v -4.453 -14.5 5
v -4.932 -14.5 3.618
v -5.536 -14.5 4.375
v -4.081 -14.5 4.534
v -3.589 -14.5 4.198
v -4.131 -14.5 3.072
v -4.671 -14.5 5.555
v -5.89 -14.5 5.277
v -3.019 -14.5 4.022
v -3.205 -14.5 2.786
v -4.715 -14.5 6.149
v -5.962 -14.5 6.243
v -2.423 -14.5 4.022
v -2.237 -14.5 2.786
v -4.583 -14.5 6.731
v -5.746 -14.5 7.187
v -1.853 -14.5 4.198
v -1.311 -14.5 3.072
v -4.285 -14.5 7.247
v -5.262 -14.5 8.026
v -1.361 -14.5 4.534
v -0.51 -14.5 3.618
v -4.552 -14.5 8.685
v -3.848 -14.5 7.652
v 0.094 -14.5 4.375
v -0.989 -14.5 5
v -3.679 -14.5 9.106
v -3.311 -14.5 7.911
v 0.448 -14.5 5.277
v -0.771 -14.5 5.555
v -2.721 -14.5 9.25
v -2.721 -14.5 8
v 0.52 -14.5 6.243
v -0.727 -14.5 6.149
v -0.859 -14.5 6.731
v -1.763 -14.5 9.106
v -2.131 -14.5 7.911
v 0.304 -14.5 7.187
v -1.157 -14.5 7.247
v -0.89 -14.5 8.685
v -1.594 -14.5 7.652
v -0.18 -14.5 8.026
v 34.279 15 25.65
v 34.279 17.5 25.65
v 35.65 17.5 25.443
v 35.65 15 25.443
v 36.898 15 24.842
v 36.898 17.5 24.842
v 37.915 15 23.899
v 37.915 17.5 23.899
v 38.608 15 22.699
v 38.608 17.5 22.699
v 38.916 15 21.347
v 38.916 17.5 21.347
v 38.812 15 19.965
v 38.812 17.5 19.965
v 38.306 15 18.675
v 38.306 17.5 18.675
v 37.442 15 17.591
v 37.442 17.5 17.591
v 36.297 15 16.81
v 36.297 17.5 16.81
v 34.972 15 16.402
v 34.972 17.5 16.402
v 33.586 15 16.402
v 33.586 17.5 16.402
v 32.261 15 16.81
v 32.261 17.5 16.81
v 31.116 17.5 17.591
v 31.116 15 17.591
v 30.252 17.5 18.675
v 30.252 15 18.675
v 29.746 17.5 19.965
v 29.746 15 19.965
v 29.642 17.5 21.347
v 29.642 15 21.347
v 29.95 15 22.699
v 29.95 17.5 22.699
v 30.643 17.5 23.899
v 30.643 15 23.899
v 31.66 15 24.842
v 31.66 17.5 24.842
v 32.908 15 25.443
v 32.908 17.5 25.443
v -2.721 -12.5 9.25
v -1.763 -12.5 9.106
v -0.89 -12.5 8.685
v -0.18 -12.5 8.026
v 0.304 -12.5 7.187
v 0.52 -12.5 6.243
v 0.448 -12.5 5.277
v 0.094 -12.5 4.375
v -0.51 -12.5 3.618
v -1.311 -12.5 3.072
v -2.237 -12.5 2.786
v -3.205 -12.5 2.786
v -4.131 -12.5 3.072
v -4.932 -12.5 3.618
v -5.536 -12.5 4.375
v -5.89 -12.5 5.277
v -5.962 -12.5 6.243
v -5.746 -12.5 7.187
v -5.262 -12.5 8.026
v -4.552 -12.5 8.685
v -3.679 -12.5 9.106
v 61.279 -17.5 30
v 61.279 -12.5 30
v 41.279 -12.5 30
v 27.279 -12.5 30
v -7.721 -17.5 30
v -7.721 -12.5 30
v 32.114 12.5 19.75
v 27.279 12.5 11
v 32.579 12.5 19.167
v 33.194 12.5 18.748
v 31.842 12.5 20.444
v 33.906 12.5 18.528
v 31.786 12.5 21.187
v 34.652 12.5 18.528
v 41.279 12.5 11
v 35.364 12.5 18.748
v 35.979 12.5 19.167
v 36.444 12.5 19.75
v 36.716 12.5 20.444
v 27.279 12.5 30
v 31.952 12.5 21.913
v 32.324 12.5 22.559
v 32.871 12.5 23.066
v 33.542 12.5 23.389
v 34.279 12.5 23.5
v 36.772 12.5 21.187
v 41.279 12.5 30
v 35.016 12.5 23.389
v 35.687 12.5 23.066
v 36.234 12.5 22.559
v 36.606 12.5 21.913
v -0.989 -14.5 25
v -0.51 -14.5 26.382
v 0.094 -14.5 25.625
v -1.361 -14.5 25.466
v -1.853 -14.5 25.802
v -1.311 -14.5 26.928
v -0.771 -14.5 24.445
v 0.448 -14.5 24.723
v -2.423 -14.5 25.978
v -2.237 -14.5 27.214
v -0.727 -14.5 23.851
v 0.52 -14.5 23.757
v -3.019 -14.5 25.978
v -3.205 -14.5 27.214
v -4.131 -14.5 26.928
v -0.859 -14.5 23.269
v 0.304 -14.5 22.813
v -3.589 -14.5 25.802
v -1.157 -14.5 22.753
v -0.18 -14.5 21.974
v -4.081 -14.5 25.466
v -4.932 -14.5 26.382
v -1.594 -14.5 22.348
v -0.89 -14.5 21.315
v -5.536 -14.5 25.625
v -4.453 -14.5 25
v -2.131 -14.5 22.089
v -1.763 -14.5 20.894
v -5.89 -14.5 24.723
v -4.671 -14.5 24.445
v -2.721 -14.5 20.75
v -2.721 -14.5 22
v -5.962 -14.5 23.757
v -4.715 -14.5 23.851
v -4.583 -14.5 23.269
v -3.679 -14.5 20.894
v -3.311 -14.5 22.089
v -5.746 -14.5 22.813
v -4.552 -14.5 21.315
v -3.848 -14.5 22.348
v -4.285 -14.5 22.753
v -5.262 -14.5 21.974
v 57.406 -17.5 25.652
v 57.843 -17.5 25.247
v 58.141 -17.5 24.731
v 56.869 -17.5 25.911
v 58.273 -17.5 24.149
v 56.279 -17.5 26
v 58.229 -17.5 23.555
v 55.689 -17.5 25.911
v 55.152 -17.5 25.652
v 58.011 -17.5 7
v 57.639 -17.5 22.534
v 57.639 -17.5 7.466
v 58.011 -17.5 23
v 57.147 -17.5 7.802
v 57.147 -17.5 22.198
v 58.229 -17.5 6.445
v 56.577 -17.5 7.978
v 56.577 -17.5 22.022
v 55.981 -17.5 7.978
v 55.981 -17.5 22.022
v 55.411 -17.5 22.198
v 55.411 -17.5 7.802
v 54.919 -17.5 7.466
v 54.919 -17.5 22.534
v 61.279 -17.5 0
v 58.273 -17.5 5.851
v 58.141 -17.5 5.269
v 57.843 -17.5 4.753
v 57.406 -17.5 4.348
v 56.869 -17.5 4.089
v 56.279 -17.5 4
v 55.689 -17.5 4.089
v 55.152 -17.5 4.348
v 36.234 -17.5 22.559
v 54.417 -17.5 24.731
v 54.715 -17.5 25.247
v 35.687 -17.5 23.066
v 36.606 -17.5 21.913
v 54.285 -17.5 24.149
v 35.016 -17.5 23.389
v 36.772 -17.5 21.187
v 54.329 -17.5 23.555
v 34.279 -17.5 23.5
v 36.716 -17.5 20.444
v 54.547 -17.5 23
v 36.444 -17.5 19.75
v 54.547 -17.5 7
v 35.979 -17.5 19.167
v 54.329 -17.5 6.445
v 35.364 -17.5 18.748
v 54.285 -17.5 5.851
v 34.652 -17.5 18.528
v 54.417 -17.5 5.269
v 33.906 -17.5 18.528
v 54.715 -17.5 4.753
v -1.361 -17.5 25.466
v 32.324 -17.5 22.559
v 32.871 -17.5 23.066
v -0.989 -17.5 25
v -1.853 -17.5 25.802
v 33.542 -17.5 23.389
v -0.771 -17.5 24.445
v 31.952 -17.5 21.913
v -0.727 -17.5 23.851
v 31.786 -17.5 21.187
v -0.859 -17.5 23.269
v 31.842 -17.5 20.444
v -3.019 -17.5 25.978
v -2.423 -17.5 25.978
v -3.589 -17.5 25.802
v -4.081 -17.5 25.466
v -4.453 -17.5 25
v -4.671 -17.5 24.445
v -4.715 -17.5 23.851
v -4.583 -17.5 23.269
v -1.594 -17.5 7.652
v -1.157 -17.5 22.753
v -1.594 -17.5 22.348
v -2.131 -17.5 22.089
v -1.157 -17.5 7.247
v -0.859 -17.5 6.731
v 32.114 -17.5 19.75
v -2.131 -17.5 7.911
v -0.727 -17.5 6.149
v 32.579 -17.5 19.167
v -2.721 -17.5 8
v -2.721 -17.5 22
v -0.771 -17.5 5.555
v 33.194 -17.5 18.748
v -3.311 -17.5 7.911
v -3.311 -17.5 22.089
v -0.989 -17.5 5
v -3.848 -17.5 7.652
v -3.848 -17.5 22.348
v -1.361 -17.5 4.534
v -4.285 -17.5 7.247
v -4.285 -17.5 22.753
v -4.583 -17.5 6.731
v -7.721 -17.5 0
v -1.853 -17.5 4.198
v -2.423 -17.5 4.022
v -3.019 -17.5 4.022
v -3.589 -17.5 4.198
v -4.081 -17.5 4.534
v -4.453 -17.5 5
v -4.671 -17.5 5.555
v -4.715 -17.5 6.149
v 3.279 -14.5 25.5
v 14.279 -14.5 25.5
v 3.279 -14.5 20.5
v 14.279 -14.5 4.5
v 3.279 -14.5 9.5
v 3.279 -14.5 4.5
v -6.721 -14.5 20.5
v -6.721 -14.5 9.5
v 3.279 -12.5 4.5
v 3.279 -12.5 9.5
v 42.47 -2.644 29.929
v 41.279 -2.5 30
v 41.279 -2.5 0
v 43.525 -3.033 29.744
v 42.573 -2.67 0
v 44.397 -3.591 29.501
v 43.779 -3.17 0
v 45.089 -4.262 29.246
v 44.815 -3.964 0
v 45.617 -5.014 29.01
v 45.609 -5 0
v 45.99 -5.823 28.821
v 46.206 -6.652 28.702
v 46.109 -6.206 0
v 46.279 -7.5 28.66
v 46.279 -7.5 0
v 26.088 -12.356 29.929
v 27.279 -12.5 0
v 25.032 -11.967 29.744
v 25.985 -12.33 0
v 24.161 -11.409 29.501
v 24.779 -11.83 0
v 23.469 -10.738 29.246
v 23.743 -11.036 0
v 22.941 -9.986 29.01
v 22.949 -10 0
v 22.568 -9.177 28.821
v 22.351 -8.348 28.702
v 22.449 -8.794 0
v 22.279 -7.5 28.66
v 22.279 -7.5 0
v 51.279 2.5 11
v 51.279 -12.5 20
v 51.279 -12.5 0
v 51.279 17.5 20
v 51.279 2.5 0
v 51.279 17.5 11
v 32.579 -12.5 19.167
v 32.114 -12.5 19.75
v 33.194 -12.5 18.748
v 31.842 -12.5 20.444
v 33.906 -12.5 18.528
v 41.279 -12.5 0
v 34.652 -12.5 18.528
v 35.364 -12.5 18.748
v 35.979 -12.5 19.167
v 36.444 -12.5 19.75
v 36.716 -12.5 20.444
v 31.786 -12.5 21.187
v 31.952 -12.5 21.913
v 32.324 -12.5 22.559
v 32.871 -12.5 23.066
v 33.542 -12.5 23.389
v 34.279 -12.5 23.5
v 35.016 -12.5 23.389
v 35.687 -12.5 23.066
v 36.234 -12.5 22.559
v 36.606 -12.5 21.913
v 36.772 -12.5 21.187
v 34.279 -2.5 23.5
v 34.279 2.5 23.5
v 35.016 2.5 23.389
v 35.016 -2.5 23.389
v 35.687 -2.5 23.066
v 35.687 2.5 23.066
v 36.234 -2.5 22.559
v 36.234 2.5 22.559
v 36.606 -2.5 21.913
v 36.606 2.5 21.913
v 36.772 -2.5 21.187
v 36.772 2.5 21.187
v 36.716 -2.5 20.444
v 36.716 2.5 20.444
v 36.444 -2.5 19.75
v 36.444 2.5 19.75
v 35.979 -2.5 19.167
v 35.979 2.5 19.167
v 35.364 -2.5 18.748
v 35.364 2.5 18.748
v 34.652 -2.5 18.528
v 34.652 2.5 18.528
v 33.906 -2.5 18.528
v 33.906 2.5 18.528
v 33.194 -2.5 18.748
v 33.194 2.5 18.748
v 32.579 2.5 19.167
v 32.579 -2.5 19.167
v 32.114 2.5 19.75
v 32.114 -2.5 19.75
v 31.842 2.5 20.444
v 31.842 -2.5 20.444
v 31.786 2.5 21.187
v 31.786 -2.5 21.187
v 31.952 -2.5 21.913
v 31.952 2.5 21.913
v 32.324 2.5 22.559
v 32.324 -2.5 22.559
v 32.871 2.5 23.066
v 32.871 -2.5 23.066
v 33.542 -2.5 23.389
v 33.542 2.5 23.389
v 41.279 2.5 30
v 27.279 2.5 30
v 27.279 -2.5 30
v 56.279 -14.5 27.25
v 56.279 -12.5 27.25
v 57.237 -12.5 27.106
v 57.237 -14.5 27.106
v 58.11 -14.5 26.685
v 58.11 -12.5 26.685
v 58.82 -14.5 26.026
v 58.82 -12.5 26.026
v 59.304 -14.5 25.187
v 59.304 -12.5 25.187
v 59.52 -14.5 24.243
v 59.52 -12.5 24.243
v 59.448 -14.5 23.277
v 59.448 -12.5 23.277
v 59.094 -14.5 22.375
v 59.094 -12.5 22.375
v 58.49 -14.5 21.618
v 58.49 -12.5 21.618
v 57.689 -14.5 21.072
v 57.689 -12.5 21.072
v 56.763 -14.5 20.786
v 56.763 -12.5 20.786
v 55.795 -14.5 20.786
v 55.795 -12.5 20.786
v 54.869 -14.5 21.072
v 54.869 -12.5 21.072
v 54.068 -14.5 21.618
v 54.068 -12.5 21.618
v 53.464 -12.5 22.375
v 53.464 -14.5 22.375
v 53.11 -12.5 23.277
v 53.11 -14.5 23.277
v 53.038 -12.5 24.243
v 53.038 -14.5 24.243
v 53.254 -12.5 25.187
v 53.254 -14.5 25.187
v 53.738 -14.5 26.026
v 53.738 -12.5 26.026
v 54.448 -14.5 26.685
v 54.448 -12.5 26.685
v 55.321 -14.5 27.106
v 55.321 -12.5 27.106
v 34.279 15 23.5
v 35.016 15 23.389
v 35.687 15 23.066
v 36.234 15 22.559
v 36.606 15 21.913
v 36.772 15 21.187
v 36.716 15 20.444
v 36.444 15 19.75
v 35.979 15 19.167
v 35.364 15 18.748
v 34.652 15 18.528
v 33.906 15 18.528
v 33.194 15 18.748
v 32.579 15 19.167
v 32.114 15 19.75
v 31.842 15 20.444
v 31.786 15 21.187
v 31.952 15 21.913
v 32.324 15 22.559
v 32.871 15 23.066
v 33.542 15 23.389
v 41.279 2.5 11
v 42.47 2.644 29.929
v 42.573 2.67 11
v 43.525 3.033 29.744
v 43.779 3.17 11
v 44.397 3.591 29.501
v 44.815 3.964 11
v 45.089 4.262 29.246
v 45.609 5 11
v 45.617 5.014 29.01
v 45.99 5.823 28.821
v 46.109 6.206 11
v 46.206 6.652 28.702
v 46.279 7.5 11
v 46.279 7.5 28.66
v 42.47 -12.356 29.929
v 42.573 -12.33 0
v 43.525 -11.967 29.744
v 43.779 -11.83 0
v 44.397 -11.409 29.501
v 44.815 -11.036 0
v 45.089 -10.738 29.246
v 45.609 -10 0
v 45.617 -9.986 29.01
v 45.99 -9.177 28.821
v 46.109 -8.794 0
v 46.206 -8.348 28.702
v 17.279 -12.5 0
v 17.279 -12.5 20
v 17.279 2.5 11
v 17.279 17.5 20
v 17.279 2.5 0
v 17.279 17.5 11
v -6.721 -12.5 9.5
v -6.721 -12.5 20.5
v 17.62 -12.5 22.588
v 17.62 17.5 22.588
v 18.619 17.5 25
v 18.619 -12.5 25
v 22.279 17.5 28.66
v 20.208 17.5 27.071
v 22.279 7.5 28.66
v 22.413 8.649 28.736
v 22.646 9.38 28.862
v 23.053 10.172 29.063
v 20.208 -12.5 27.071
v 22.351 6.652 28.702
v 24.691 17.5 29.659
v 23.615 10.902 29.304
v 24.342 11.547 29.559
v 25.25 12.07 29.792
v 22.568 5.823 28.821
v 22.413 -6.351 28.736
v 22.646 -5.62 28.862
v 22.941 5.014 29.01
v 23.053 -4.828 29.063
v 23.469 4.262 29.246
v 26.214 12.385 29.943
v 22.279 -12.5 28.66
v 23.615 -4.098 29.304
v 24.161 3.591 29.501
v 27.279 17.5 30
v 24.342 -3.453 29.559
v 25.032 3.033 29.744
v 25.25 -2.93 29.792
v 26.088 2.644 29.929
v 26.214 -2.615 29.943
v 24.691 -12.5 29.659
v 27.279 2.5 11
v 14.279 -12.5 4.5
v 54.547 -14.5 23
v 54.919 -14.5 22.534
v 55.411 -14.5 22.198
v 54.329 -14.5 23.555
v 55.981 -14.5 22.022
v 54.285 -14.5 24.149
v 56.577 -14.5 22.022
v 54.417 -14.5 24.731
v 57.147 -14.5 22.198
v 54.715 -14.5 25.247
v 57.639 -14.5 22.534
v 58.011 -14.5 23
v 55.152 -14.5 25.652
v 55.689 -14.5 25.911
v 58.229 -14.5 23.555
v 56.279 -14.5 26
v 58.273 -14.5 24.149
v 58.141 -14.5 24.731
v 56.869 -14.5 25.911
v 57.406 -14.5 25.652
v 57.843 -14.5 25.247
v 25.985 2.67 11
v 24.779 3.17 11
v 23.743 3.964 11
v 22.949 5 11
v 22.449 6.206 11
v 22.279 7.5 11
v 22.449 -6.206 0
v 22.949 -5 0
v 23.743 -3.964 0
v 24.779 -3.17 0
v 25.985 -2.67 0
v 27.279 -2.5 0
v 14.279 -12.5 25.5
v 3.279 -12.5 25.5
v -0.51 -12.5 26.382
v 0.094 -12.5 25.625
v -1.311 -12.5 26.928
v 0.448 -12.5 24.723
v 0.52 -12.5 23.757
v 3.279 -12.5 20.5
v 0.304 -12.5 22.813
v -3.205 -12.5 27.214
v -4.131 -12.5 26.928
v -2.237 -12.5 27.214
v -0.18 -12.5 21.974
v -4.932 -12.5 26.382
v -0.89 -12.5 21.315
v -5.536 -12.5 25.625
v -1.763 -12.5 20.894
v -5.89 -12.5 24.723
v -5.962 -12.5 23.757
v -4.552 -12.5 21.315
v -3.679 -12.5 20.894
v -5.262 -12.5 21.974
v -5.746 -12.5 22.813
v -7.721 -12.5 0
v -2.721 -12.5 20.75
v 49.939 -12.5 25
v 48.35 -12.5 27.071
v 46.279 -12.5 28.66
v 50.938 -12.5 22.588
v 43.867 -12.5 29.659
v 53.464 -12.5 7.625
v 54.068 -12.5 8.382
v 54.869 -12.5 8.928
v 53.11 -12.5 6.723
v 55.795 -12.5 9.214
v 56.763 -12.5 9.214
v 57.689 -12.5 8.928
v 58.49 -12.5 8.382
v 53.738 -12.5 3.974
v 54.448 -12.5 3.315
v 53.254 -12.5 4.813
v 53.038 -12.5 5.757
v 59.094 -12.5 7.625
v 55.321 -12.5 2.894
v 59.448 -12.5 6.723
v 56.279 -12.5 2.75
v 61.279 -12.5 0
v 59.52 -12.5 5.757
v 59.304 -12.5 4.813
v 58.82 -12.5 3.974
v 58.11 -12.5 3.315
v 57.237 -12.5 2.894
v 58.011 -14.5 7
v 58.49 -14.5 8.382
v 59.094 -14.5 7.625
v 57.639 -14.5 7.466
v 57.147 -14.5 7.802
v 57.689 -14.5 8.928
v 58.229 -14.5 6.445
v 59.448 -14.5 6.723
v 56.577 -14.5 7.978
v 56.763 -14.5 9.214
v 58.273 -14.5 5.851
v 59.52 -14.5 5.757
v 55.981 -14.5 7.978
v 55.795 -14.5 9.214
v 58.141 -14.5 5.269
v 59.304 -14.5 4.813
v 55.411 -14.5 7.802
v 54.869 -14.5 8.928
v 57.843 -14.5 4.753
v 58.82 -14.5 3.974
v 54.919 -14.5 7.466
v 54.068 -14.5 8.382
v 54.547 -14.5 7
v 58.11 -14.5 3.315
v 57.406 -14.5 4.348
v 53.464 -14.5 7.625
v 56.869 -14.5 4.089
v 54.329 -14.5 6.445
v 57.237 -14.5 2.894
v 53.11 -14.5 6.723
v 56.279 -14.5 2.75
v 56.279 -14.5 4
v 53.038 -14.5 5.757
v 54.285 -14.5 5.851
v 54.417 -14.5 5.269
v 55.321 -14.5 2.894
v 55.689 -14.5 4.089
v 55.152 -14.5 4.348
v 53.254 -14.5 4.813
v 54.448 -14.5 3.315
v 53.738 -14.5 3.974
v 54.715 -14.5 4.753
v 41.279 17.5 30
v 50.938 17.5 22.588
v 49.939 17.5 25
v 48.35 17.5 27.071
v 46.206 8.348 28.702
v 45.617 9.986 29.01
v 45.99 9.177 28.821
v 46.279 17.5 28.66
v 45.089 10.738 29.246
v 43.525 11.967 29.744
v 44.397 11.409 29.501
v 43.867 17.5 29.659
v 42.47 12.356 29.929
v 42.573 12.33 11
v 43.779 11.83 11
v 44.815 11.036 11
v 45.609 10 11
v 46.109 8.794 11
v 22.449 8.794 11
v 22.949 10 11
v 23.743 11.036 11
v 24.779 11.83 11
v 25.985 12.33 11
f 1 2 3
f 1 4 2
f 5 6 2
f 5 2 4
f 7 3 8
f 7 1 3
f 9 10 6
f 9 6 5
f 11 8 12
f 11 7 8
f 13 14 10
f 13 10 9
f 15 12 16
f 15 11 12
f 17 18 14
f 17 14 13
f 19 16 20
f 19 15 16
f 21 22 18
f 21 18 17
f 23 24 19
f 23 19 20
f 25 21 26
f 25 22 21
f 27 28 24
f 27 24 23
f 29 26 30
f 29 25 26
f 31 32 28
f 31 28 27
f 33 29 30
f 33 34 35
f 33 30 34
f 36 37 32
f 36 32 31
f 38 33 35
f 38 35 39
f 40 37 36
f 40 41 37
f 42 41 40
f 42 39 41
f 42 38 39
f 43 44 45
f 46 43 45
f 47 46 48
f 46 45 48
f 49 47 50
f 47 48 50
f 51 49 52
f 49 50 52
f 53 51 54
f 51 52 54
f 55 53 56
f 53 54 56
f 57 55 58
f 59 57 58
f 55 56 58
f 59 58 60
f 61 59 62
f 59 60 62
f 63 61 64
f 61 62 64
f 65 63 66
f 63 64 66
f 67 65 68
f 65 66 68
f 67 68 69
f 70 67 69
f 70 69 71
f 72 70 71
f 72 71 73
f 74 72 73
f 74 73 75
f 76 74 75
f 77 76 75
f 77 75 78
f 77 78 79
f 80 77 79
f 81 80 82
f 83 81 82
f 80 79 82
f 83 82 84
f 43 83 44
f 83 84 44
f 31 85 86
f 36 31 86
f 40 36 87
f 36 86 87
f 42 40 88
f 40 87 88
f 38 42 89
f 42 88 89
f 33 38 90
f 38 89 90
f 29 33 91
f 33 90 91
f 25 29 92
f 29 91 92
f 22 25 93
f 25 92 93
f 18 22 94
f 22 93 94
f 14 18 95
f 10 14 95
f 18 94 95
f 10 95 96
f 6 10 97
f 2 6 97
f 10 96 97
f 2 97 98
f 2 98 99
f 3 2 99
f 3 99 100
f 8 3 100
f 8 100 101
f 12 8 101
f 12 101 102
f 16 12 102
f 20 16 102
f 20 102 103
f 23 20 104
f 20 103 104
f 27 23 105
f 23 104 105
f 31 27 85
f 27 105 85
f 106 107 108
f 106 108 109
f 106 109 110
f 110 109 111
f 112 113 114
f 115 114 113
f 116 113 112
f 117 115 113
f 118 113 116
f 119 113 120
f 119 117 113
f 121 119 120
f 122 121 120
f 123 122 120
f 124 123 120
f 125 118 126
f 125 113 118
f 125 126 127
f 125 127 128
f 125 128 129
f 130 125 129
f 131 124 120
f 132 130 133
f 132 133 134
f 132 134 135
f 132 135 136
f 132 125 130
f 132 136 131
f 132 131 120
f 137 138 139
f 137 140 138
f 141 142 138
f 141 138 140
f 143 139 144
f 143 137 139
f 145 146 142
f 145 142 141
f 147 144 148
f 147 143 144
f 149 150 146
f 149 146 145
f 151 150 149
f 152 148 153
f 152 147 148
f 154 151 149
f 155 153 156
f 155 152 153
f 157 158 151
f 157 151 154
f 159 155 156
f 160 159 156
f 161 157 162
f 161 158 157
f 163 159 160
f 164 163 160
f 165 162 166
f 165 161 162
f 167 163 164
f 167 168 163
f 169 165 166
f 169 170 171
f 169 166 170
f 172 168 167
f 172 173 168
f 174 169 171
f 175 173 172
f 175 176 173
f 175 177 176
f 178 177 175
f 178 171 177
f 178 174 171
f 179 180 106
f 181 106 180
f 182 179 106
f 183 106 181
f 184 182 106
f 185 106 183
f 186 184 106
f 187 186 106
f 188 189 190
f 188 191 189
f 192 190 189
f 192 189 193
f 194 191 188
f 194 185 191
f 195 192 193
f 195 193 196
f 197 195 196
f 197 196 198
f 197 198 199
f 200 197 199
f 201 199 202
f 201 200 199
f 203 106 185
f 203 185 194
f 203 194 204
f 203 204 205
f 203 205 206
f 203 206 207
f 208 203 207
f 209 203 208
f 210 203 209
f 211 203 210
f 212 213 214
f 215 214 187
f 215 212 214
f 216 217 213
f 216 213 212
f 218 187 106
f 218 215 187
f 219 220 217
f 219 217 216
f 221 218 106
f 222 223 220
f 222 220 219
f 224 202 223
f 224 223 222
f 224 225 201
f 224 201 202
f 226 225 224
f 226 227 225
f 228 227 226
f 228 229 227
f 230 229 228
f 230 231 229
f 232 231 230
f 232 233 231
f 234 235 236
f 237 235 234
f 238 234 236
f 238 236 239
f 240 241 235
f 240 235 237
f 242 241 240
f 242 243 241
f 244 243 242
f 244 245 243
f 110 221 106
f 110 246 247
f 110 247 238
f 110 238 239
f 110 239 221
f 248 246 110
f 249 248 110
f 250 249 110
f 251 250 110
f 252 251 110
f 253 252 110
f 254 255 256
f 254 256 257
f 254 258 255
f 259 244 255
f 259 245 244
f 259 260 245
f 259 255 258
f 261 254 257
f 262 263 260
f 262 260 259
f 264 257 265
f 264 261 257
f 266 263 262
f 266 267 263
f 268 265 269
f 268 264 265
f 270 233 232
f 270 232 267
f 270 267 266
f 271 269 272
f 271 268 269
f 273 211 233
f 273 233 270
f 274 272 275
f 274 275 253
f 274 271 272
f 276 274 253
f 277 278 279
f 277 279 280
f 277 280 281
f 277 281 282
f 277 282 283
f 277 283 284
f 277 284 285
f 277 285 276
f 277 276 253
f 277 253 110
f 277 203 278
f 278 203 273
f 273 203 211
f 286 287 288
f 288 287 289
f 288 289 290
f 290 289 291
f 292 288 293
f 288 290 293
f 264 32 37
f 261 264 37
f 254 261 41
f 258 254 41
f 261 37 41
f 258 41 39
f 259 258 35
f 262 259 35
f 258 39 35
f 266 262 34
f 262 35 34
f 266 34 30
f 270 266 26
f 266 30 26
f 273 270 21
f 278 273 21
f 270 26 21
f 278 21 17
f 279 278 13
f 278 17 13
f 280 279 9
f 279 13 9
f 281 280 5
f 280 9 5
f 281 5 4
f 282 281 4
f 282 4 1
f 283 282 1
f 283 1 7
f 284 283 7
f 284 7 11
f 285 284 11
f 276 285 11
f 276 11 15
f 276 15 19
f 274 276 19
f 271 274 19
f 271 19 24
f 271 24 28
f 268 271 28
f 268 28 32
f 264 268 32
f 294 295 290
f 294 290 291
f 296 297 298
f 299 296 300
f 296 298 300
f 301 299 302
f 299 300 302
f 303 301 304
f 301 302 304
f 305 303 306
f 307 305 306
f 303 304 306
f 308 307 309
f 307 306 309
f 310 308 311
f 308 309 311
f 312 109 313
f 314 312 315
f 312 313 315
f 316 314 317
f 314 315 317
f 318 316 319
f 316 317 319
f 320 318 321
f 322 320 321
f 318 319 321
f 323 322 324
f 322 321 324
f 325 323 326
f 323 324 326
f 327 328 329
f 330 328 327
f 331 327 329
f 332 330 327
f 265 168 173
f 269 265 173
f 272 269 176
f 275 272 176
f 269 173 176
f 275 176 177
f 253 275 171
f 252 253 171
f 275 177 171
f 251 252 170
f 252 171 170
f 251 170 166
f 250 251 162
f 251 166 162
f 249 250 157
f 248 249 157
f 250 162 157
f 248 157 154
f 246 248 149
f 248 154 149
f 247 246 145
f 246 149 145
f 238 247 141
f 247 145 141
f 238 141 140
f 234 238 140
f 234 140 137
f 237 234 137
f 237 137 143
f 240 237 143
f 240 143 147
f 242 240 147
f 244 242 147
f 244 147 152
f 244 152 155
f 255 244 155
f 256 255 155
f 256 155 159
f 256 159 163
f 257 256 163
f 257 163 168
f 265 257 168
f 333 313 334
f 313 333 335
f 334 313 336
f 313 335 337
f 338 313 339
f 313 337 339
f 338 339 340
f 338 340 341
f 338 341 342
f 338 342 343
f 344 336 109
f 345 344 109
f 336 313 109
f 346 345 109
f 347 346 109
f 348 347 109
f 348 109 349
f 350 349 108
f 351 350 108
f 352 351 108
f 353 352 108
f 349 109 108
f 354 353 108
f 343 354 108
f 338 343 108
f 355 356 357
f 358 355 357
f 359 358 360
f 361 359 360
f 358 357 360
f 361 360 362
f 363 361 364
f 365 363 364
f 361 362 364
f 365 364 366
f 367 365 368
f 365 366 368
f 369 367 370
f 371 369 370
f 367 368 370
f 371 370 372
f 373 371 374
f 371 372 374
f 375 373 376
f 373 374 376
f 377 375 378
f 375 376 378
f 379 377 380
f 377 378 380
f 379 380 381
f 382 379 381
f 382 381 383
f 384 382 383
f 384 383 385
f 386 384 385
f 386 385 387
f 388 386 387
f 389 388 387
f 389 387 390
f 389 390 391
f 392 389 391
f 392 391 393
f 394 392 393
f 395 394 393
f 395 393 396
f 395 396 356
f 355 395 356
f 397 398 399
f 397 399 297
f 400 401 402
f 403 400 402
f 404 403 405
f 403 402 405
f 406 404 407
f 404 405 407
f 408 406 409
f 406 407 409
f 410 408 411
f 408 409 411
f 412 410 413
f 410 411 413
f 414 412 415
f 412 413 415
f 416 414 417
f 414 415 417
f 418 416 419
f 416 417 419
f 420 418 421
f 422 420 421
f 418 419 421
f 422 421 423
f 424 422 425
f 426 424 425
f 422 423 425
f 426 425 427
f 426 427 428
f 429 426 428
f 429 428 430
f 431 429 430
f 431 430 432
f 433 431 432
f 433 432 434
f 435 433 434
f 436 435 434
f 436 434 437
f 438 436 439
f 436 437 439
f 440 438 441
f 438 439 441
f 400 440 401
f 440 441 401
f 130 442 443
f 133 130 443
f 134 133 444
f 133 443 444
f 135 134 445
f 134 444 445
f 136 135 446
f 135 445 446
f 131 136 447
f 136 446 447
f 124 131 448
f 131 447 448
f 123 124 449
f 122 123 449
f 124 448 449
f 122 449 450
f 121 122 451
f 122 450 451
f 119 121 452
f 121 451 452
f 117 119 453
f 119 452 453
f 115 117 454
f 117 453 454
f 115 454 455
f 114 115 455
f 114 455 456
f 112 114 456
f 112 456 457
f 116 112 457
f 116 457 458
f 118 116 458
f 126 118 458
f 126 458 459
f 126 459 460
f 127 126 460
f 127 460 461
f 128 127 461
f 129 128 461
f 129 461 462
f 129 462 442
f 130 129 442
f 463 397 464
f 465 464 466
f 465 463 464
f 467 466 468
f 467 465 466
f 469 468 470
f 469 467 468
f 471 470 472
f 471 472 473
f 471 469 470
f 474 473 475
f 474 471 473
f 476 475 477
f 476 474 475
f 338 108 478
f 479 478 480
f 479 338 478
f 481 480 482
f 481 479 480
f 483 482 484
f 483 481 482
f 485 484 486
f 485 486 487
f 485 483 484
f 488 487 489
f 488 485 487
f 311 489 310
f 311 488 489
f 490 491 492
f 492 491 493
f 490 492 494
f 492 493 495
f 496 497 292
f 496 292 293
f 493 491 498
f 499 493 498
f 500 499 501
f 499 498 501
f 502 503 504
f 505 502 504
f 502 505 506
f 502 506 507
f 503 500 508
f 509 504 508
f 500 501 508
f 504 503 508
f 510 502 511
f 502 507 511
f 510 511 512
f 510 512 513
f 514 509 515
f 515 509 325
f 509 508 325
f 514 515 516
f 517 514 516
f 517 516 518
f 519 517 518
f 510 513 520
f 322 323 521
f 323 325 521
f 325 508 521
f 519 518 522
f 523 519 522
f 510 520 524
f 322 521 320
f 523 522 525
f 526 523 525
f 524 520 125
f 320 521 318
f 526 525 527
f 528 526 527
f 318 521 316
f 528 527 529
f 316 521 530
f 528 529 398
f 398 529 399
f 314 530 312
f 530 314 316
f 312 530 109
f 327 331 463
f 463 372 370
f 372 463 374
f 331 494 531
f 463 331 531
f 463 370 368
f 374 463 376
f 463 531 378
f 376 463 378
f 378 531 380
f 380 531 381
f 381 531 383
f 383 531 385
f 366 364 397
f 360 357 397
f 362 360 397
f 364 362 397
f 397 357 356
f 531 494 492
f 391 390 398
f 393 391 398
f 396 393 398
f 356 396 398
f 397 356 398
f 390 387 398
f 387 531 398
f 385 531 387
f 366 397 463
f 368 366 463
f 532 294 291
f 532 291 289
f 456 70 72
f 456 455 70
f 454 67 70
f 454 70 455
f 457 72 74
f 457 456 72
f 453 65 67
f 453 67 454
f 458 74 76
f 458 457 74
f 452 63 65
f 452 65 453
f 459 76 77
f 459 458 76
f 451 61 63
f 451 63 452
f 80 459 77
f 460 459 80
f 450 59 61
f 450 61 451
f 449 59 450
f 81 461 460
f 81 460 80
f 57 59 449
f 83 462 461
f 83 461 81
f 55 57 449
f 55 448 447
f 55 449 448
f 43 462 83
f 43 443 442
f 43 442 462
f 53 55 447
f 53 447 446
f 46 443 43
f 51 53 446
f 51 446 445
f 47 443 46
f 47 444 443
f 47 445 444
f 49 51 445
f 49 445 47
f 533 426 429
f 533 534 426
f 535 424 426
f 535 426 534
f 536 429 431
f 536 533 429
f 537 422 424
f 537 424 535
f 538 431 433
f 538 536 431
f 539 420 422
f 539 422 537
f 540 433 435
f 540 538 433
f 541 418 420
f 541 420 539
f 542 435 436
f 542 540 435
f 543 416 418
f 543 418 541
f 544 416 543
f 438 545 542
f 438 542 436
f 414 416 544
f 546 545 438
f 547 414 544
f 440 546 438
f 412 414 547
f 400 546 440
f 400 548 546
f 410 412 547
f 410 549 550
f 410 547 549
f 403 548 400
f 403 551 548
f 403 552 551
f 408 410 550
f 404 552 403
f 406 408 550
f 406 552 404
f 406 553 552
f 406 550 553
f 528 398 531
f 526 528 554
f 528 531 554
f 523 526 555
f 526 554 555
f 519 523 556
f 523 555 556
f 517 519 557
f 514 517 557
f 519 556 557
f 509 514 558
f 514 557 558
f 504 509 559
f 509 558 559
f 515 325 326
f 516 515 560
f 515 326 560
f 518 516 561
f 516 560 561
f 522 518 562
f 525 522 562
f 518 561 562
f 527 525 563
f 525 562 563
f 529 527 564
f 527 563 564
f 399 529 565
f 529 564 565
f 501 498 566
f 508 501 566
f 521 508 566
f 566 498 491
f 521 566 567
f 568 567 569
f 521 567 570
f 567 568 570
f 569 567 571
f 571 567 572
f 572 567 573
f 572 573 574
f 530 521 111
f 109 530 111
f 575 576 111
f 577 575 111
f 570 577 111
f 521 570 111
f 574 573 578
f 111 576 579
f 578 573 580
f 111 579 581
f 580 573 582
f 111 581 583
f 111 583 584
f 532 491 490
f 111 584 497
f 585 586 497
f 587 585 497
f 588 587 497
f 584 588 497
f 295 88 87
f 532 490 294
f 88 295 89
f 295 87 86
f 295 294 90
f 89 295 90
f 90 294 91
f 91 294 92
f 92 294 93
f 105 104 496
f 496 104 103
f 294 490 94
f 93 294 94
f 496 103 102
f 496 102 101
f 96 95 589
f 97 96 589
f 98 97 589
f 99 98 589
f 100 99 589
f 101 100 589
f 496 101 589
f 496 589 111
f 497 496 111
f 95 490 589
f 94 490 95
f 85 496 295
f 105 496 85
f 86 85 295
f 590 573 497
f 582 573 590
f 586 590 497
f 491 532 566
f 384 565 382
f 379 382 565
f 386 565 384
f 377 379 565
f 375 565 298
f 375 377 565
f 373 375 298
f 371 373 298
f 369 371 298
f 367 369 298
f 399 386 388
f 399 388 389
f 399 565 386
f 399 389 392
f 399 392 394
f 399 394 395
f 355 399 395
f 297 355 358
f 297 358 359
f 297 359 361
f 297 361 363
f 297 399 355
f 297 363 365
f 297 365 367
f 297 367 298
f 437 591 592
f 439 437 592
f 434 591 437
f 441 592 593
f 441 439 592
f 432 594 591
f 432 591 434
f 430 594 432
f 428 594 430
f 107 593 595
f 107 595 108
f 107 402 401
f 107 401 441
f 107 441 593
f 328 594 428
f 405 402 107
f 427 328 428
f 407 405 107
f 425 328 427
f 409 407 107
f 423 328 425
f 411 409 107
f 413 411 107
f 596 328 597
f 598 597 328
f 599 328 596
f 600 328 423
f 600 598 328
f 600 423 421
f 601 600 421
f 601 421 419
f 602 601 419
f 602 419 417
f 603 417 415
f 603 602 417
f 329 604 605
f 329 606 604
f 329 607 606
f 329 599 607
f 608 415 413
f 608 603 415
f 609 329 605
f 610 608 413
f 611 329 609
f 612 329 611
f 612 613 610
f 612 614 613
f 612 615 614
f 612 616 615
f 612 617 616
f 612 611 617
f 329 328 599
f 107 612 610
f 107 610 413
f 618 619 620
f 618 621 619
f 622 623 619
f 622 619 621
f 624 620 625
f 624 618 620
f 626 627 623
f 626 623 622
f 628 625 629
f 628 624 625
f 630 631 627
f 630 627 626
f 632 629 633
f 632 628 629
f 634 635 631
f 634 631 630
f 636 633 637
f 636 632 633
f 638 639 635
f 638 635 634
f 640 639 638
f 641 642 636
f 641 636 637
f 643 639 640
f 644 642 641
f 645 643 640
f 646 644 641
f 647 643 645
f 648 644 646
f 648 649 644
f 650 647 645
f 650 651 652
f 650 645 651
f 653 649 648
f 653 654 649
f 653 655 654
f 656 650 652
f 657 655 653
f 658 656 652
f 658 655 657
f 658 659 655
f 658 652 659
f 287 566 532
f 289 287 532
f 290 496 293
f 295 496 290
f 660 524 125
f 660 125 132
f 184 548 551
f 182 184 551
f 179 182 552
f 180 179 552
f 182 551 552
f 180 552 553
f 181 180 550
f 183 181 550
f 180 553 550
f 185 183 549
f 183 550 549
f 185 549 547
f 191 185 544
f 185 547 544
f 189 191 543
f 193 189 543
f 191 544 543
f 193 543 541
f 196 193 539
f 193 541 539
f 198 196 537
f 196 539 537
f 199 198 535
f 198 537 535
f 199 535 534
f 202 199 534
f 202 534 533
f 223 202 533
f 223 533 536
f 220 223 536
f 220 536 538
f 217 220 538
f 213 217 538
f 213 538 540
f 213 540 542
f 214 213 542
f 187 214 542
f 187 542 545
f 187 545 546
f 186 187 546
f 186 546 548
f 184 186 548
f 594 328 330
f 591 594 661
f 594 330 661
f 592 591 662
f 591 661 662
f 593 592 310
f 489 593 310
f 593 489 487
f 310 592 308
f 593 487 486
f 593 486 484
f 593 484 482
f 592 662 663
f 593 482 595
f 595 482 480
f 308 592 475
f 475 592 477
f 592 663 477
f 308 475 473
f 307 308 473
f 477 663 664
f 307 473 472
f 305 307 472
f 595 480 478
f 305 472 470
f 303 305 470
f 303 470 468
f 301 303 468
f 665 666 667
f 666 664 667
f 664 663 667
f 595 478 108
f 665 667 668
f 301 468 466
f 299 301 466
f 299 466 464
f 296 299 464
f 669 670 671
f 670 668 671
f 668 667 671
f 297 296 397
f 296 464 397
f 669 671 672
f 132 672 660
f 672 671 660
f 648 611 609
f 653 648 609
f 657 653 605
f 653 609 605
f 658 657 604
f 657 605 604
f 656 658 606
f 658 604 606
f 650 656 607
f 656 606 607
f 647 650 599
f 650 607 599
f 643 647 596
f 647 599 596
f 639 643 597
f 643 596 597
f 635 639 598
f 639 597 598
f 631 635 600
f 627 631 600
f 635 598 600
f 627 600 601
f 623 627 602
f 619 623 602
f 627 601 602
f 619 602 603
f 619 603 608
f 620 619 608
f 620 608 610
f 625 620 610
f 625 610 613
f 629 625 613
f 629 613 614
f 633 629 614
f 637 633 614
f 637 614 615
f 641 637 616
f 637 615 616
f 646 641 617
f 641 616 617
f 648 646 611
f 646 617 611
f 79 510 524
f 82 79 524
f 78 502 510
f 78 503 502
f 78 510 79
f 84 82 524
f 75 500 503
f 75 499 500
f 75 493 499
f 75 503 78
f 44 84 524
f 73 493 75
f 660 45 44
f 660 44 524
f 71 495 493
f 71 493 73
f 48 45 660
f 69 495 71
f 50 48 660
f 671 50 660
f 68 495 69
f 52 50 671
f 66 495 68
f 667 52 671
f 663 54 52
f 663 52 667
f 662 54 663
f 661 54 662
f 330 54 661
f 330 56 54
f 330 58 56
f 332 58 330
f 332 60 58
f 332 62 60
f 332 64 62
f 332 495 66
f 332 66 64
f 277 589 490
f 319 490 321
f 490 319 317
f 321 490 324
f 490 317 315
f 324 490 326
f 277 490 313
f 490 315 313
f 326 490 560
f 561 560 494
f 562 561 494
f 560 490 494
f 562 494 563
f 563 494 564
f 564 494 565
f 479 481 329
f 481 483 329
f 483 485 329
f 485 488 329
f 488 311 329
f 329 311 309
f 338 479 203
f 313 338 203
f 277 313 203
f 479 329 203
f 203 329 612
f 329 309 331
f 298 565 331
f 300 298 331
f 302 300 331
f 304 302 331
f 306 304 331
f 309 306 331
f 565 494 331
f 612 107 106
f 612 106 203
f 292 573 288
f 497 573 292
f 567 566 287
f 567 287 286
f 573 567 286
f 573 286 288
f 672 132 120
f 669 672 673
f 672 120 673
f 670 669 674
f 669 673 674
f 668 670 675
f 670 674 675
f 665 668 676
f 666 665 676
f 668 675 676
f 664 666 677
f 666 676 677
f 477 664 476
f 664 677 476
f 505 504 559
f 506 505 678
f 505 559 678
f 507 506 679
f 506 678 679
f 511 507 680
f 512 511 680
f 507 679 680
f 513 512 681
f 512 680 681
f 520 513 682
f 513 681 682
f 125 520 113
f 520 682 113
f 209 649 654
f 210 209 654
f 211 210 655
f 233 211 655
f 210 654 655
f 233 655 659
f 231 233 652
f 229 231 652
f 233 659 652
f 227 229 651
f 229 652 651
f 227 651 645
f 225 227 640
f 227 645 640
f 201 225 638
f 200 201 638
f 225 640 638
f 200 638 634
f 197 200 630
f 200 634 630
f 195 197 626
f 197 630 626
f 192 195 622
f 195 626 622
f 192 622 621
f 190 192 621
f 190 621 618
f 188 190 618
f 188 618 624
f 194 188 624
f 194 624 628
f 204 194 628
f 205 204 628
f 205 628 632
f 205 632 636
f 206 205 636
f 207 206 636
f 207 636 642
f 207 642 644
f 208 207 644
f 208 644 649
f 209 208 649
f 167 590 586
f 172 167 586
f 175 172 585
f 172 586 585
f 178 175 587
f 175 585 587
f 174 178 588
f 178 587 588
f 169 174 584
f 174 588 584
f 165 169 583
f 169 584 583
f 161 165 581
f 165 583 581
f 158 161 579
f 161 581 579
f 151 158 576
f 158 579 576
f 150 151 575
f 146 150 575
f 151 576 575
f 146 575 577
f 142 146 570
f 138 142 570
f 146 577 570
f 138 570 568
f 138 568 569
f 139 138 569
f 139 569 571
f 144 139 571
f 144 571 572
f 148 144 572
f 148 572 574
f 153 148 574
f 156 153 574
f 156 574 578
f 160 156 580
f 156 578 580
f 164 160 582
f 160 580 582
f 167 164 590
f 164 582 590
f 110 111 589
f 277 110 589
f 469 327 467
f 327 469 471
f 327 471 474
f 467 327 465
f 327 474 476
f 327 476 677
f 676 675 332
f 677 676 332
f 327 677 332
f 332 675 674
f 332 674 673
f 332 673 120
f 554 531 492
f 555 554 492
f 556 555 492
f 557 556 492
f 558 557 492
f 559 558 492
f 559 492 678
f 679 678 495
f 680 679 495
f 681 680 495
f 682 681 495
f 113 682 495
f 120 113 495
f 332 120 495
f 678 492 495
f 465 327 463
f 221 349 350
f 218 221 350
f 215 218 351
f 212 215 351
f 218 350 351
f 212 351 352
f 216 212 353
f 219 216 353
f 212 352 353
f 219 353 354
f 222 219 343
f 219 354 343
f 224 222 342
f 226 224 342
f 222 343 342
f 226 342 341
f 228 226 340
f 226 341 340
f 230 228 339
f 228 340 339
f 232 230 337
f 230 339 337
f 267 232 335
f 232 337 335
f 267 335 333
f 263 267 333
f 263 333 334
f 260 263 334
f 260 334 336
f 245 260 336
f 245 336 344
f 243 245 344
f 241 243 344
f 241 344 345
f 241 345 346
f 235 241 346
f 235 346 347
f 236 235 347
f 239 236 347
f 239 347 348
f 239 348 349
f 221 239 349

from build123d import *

# Parameters (mm, degrees)
CROQUIS21_W             = 34
CROQUIS21_H             = 30
SALIENTE_EXTRUIR4_DEPTH = 17.5
CORTAR_EXTRUIR17_REACH  = 63.934
CROQUIS22_W             = 24
CROQUIS22_H             = 10
CORTAR_EXTRUIR18_REACH  = 50.603
CROQUIS23_W             = 11
CROQUIS23_H             = 15
CORTAR_EXTRUIR19_REACH  = 70.953
CROQUIS24_R             = 2.5
CROQUIS25_R             = 4.65
CORTAR_EXTRUIR20_DEPTH  = 2.5
REDONDEO2_R             = 10
REDONDEO3_R             = 5
CROQUIS27_R             = 2
SALIENTE_EXTRUIR5_DEPTH = 5
CROQUIS30_R             = 3.25
CORTAR_EXTRUIR21_DEPTH  = 2


# Some blends are built 0.0001 mm under size
with BuildPart() as part:
    # Croquis21 → Saliente-Extruir4 (new, symmetric)
    with BuildSketch(Plane(origin=(0, 0, 0), x_dir=(1, 0, 0), z_dir=(0, 1, 0))):
        with Locations((34.278993672, -15)):
            Rectangle(CROQUIS21_W, CROQUIS21_H)
    extrude(amount=SALIENTE_EXTRUIR4_DEPTH, both=True)

    # Croquis22 → Cortar-Extruir17 (cut, up to next)
    with BuildSketch(Plane.XY.offset(30), mode=Mode.PRIVATE) as cortar_extruir17_sk1:
        with Locations((34.278993672, 7.5)):
            Rectangle(CROQUIS22_W, CROQUIS22_H)
    cortar_extruir17_tool1 = extrude(cortar_extruir17_sk1.sketch, amount=-CORTAR_EXTRUIR17_REACH, mode=Mode.PRIVATE) & part.part
    # Croquis22 → Cortar-Extruir17 (cut, up to next)
    with BuildSketch(Plane.XY.offset(30), mode=Mode.PRIVATE) as cortar_extruir17_sk2:
        with Locations((34.278993672, -7.5)):
            Rectangle(CROQUIS22_W, CROQUIS22_H)
    cortar_extruir17_tool2 = extrude(cortar_extruir17_sk2.sketch, amount=-CORTAR_EXTRUIR17_REACH, mode=Mode.PRIVATE) & part.part
    add(cortar_extruir17_tool1.solids().sort_by_distance((34.278994, 7.5, 30))[0], mode=Mode.SUBTRACT)
    add(cortar_extruir17_tool2.solids().sort_by_distance((34.278994, -7.5, 30))[0], mode=Mode.SUBTRACT)

    # Croquis23 → Cortar-Extruir18 (cut, up to next)
    with BuildSketch(Plane.ZY.offset(-17.278993672), mode=Mode.PRIVATE) as cortar_extruir18_sk1:
        with Locations((5.5, 10)):
            Rectangle(CROQUIS23_W, CROQUIS23_H)
    cortar_extruir18_tool1 = extrude(cortar_extruir18_sk1.sketch, amount=-CORTAR_EXTRUIR18_REACH, mode=Mode.PRIVATE) & part.part
    add(cortar_extruir18_tool1.solids().sort_by_distance((17.278994, 10, 5.5))[0], mode=Mode.SUBTRACT)

    # Cortar-Extruir19: up to this face of the body (flat: up to its plane)
    cortar_extruir19_end = Plane(part.part.faces().sort_by_distance((34.278993672, -17.5, 15))[0])
    # Croquis24 → Cortar-Extruir19 (cut, up to the picked face)
    with BuildSketch(Plane(origin=(0, 17.5, 0), x_dir=(1, 0, 0), z_dir=(0, 1, 0)), mode=Mode.PRIVATE) as cortar_extruir19_sk1:
        with Locations(Location((34.278993672, -21, 0), (0, 0, 270))):
            Circle(CROQUIS24_R)
    cortar_extruir19_tool1 = split(extrude(cortar_extruir19_sk1.sketch, amount=-CORTAR_EXTRUIR19_REACH, mode=Mode.PRIVATE), bisect_by=cortar_extruir19_end, keep=Keep.BOTH, mode=Mode.PRIVATE)
    add(cortar_extruir19_tool1.solids().sort_by(Axis((34.278994, 17.5, 21), (0, -1, 0)))[0], mode=Mode.SUBTRACT)

    # Croquis25 → Cortar-Extruir20 (cut)
    with BuildSketch(Plane(origin=(0, 17.5, 0), x_dir=(1, 0, 0), z_dir=(0, 1, 0))):
        with Locations(Location((34.278993672, -21, 0), (0, 0, 270))):
            Circle(CROQUIS25_R)
    extrude(amount=-CORTAR_EXTRUIR20_DEPTH, mode=Mode.SUBTRACT)

    # Redondeo2
    # the kernel refuses this fillet: 10 mm, written as the material it takes off along each edge
    with BuildSketch(Plane(origin=(51.278993672, 42.5, 30), x_dir=(0, 0, -1), z_dir=(0, -1, 0)), Plane(origin=(17.278993672, -42.5, 30), x_dir=(0, 0, -1), z_dir=(0, 1, 0))) as redondeo2_piece_1:
        with BuildLine():
            CenterArc((REDONDEO2_R, -REDONDEO2_R), REDONDEO2_R, 90, 90)
            Line((0, -REDONDEO2_R), (0, 0))
            Line((0, 0), (REDONDEO2_R, 0))
        make_face()
    extrude(amount=85, mode=Mode.SUBTRACT)

    # Redondeo3
    redondeo3_edges = [part.edges().sort_by_distance(p)[0] for p in [
        (46.278993672, 12.5, 19.830127019),
        (46.278993672, 2.5, 19.830127019),
        (46.278993672, -12.5, 14.330127019),
        (22.278993672, -12.5, 14.330127019),
        (22.278993672, -2.5, 14.330127019),
        (22.278993672, 12.5, 19.830127019),
        (22.278993672, 2.5, 19.830127019),
        (46.278993672, -2.5, 14.330127019),
    ]]
    fillet(redondeo3_edges, radius=REDONDEO3_R - 0.0001)  # a hair under: the kernel refuses the full size

    # Croquis27 → Saliente-Extruir5 (add)
    # profile 1 of 2: a face of its own
    with BuildSketch(Plane(origin=(0, -12.5, 0), x_dir=(1, 0, 0), z_dir=(0, 1, 0))):
        with BuildLine():
            Line((27.278993672, -30), (17.278993672, -30))
            Line((17.278993672, -30), (-7.721006328, -30))
            Line((-7.721006328, -30), (-7.721006328, 0))
            Line((-7.721006328, 0), (17.278993672, 0))
            Line((17.278993672, 0), (17.278993672, -20))
            ThreePointArc((17.278993672, -20), (20.20792586, -27.071067812), (27.278993672, -30))
        make_face()
        with Locations(Location((-2.721006328, -6, 0), (0, 0, 270))):
            Circle(CROQUIS27_R, mode=Mode.SUBTRACT)
        with Locations(Location((-2.721006328, -24, 0), (0, 0, 90))):
            Circle(CROQUIS27_R, mode=Mode.SUBTRACT)
    # profile 2 of 2: a face of its own
    with BuildSketch(Plane(origin=(0, -12.5, 0), x_dir=(1, 0, 0), z_dir=(0, 1, 0))):
        with BuildLine():
            Line((51.278993672, 0), (51.278993672, -20))
            ThreePointArc((51.278993672, -20), (48.350061484, -27.071067812), (41.278993672, -30))
            Line((41.278993672, -30), (61.278993672, -30))
            Line((61.278993672, -30), (61.278993672, 0))
            Line((61.278993672, 0), (51.278993672, 0))
        make_face()
        with Locations(Location((56.278993672, -6, 0), (0, 0, 90))):
            Circle(CROQUIS27_R, mode=Mode.SUBTRACT)
        with Locations(Location((56.278993672, -24, 0), (0, 0, 270))):
            Circle(CROQUIS27_R, mode=Mode.SUBTRACT)
    extrude(amount=-SALIENTE_EXTRUIR5_DEPTH)

    # Croquis30 → Cortar-Extruir21 (cut)
    with BuildSketch(Plane(origin=(0, -12.5, 0), x_dir=(1, 0, 0), z_dir=(0, 1, 0))):
        with Locations(Location((-2.721006328, -6, 0), (0, 0, 270))):
            Circle(CROQUIS30_R)
        with Locations(Location((-2.721006328, -24, 0), (0, 0, 90))):
            Circle(CROQUIS30_R)
        with Locations(Location((56.278993672, -6, 0), (0, 0, 90))):
            Circle(CROQUIS30_R)
        with Locations(Location((56.278993672, -24, 0), (0, 0, 270))):
            Circle(CROQUIS30_R)
        Polygon((3.278993672, -4.5), (14.278993672, -4.5), (14.278993672, -9.5), (14.278993672, -20.5), (14.278993672, -25.5), (3.278993672, -25.5), (3.278993672, -20.5), (-6.721006328, -20.5), (-6.721006328, -9.5), (3.278993672, -9.5), align=None)
    extrude(amount=-CORTAR_EXTRUIR21_DEPTH, mode=Mode.SUBTRACT)


solid = part.part
